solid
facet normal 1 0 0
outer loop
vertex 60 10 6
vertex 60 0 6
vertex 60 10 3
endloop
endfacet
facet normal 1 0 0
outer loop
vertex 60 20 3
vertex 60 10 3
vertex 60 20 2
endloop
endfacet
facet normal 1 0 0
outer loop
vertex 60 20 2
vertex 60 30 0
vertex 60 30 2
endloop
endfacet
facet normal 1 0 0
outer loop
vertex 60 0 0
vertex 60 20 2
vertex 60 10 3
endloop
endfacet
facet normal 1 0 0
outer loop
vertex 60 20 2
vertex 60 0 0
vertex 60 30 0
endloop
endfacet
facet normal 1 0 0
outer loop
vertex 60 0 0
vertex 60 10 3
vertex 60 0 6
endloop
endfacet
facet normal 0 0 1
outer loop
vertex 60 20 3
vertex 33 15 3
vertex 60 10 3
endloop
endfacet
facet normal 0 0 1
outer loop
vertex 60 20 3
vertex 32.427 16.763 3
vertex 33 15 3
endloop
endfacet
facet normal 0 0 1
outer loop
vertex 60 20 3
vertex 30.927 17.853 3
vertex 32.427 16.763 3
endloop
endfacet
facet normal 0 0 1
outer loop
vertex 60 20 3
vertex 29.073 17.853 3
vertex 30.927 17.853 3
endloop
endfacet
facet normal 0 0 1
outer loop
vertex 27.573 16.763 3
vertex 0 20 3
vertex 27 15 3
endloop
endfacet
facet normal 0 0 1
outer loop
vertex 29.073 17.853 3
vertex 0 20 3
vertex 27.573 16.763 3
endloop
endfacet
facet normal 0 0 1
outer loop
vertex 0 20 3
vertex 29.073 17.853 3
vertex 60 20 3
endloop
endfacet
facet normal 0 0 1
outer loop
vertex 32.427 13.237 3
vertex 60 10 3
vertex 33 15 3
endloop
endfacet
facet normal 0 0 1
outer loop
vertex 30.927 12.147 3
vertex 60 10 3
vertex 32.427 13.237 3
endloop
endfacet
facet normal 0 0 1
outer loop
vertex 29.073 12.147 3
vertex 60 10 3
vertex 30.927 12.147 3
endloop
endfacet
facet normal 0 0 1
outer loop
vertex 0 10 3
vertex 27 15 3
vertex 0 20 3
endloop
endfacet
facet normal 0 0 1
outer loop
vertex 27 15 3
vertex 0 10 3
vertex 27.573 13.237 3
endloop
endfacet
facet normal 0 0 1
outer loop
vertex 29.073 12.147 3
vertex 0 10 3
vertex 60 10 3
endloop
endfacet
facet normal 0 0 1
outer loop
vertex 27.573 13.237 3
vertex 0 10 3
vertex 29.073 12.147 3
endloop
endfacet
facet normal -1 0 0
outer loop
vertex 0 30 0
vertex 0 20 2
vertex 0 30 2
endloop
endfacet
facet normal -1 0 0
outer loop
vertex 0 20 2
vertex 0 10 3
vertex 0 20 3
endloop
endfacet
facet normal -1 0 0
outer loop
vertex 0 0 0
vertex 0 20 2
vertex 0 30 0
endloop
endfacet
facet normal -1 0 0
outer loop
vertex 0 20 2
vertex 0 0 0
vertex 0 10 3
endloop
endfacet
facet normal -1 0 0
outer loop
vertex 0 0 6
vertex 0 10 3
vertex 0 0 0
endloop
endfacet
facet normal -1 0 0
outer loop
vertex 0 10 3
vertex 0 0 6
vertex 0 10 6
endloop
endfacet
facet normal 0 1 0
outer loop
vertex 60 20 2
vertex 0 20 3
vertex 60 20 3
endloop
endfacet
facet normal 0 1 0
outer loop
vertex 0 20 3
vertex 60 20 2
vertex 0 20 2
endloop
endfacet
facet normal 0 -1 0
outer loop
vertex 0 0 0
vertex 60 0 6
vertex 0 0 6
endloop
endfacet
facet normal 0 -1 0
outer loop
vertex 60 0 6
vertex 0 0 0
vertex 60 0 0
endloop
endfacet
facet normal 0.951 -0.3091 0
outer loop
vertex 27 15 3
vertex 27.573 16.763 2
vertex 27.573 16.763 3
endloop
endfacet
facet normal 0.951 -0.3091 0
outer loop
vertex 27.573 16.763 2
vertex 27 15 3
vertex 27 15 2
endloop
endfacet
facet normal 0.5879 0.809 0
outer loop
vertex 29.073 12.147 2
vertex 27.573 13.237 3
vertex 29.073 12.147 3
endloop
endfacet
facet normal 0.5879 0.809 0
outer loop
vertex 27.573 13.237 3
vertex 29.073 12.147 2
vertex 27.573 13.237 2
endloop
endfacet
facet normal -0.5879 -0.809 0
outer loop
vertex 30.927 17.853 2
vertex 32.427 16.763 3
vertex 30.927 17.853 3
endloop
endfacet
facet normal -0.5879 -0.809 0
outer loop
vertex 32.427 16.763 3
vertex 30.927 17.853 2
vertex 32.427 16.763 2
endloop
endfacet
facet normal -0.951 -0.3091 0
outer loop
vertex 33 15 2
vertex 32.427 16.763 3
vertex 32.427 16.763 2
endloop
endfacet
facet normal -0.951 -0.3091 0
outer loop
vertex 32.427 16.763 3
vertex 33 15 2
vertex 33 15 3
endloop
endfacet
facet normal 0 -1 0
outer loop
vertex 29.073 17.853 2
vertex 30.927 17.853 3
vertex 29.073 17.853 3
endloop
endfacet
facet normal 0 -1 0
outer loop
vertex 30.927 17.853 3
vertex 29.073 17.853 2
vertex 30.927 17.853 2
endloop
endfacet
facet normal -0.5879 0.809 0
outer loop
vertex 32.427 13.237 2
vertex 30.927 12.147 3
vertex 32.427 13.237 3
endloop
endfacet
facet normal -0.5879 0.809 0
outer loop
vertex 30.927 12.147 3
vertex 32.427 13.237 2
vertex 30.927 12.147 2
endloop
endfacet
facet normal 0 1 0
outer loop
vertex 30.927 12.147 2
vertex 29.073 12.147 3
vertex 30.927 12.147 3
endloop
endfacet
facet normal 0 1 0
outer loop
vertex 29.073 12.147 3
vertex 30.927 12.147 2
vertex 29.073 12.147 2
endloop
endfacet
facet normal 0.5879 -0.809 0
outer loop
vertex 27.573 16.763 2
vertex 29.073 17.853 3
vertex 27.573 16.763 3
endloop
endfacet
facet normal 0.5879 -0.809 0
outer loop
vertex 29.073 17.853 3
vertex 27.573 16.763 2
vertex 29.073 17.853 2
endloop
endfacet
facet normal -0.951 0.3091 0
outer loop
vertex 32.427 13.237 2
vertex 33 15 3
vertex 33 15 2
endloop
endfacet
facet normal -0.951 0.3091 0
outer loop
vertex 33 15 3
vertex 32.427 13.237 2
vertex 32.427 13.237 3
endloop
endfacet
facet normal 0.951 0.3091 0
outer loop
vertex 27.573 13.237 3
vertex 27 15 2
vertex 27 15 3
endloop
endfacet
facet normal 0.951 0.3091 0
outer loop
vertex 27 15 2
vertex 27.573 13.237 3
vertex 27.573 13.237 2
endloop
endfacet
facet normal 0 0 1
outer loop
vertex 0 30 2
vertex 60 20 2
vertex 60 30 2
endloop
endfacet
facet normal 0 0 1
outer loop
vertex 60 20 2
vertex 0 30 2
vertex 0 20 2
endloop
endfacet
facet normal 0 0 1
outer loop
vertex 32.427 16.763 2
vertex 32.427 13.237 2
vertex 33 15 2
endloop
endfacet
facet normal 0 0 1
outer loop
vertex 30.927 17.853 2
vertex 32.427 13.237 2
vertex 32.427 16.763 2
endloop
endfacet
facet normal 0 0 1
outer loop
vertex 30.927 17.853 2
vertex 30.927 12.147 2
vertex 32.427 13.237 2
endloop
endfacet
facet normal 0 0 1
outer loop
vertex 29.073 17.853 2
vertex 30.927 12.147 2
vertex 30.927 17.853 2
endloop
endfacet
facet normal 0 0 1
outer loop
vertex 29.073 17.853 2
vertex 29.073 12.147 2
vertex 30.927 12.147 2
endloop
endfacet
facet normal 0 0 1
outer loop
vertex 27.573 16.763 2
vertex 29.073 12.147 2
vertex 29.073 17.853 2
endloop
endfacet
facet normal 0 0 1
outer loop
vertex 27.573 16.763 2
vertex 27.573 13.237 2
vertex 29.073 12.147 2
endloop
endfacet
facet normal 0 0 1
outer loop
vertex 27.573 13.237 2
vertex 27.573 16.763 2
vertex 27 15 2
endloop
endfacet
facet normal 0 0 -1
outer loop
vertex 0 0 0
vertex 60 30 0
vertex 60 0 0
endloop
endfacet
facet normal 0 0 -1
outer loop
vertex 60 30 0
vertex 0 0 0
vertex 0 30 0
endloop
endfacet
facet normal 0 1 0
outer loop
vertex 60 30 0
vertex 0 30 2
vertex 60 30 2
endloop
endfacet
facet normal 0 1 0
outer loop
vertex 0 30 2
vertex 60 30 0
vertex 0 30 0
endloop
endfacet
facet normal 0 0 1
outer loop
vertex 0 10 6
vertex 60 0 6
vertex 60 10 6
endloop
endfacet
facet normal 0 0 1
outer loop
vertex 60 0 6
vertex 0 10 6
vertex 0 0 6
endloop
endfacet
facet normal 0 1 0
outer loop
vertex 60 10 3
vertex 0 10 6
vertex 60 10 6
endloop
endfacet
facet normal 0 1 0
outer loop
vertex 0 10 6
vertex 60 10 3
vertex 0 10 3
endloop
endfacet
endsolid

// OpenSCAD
module rail(length = 60, screenDepth = 1 ) {
overlap = 0.1;
matteDepth = 2;
frameDepth = 3;
    
cube([length,30,matteDepth]);
    

difference() {        
translate([0,0,matteDepth - overlap])
  cube([length,20, screenDepth + overlap]);
translate([length/2,15,screenDepth + matteDepth-2])
cylinder(2, 3, 3);
}
  
translate([0,0,screenDepth + matteDepth  - overlap])
  cube([length,10, frameDepth + overlap]);  

}

rail();
